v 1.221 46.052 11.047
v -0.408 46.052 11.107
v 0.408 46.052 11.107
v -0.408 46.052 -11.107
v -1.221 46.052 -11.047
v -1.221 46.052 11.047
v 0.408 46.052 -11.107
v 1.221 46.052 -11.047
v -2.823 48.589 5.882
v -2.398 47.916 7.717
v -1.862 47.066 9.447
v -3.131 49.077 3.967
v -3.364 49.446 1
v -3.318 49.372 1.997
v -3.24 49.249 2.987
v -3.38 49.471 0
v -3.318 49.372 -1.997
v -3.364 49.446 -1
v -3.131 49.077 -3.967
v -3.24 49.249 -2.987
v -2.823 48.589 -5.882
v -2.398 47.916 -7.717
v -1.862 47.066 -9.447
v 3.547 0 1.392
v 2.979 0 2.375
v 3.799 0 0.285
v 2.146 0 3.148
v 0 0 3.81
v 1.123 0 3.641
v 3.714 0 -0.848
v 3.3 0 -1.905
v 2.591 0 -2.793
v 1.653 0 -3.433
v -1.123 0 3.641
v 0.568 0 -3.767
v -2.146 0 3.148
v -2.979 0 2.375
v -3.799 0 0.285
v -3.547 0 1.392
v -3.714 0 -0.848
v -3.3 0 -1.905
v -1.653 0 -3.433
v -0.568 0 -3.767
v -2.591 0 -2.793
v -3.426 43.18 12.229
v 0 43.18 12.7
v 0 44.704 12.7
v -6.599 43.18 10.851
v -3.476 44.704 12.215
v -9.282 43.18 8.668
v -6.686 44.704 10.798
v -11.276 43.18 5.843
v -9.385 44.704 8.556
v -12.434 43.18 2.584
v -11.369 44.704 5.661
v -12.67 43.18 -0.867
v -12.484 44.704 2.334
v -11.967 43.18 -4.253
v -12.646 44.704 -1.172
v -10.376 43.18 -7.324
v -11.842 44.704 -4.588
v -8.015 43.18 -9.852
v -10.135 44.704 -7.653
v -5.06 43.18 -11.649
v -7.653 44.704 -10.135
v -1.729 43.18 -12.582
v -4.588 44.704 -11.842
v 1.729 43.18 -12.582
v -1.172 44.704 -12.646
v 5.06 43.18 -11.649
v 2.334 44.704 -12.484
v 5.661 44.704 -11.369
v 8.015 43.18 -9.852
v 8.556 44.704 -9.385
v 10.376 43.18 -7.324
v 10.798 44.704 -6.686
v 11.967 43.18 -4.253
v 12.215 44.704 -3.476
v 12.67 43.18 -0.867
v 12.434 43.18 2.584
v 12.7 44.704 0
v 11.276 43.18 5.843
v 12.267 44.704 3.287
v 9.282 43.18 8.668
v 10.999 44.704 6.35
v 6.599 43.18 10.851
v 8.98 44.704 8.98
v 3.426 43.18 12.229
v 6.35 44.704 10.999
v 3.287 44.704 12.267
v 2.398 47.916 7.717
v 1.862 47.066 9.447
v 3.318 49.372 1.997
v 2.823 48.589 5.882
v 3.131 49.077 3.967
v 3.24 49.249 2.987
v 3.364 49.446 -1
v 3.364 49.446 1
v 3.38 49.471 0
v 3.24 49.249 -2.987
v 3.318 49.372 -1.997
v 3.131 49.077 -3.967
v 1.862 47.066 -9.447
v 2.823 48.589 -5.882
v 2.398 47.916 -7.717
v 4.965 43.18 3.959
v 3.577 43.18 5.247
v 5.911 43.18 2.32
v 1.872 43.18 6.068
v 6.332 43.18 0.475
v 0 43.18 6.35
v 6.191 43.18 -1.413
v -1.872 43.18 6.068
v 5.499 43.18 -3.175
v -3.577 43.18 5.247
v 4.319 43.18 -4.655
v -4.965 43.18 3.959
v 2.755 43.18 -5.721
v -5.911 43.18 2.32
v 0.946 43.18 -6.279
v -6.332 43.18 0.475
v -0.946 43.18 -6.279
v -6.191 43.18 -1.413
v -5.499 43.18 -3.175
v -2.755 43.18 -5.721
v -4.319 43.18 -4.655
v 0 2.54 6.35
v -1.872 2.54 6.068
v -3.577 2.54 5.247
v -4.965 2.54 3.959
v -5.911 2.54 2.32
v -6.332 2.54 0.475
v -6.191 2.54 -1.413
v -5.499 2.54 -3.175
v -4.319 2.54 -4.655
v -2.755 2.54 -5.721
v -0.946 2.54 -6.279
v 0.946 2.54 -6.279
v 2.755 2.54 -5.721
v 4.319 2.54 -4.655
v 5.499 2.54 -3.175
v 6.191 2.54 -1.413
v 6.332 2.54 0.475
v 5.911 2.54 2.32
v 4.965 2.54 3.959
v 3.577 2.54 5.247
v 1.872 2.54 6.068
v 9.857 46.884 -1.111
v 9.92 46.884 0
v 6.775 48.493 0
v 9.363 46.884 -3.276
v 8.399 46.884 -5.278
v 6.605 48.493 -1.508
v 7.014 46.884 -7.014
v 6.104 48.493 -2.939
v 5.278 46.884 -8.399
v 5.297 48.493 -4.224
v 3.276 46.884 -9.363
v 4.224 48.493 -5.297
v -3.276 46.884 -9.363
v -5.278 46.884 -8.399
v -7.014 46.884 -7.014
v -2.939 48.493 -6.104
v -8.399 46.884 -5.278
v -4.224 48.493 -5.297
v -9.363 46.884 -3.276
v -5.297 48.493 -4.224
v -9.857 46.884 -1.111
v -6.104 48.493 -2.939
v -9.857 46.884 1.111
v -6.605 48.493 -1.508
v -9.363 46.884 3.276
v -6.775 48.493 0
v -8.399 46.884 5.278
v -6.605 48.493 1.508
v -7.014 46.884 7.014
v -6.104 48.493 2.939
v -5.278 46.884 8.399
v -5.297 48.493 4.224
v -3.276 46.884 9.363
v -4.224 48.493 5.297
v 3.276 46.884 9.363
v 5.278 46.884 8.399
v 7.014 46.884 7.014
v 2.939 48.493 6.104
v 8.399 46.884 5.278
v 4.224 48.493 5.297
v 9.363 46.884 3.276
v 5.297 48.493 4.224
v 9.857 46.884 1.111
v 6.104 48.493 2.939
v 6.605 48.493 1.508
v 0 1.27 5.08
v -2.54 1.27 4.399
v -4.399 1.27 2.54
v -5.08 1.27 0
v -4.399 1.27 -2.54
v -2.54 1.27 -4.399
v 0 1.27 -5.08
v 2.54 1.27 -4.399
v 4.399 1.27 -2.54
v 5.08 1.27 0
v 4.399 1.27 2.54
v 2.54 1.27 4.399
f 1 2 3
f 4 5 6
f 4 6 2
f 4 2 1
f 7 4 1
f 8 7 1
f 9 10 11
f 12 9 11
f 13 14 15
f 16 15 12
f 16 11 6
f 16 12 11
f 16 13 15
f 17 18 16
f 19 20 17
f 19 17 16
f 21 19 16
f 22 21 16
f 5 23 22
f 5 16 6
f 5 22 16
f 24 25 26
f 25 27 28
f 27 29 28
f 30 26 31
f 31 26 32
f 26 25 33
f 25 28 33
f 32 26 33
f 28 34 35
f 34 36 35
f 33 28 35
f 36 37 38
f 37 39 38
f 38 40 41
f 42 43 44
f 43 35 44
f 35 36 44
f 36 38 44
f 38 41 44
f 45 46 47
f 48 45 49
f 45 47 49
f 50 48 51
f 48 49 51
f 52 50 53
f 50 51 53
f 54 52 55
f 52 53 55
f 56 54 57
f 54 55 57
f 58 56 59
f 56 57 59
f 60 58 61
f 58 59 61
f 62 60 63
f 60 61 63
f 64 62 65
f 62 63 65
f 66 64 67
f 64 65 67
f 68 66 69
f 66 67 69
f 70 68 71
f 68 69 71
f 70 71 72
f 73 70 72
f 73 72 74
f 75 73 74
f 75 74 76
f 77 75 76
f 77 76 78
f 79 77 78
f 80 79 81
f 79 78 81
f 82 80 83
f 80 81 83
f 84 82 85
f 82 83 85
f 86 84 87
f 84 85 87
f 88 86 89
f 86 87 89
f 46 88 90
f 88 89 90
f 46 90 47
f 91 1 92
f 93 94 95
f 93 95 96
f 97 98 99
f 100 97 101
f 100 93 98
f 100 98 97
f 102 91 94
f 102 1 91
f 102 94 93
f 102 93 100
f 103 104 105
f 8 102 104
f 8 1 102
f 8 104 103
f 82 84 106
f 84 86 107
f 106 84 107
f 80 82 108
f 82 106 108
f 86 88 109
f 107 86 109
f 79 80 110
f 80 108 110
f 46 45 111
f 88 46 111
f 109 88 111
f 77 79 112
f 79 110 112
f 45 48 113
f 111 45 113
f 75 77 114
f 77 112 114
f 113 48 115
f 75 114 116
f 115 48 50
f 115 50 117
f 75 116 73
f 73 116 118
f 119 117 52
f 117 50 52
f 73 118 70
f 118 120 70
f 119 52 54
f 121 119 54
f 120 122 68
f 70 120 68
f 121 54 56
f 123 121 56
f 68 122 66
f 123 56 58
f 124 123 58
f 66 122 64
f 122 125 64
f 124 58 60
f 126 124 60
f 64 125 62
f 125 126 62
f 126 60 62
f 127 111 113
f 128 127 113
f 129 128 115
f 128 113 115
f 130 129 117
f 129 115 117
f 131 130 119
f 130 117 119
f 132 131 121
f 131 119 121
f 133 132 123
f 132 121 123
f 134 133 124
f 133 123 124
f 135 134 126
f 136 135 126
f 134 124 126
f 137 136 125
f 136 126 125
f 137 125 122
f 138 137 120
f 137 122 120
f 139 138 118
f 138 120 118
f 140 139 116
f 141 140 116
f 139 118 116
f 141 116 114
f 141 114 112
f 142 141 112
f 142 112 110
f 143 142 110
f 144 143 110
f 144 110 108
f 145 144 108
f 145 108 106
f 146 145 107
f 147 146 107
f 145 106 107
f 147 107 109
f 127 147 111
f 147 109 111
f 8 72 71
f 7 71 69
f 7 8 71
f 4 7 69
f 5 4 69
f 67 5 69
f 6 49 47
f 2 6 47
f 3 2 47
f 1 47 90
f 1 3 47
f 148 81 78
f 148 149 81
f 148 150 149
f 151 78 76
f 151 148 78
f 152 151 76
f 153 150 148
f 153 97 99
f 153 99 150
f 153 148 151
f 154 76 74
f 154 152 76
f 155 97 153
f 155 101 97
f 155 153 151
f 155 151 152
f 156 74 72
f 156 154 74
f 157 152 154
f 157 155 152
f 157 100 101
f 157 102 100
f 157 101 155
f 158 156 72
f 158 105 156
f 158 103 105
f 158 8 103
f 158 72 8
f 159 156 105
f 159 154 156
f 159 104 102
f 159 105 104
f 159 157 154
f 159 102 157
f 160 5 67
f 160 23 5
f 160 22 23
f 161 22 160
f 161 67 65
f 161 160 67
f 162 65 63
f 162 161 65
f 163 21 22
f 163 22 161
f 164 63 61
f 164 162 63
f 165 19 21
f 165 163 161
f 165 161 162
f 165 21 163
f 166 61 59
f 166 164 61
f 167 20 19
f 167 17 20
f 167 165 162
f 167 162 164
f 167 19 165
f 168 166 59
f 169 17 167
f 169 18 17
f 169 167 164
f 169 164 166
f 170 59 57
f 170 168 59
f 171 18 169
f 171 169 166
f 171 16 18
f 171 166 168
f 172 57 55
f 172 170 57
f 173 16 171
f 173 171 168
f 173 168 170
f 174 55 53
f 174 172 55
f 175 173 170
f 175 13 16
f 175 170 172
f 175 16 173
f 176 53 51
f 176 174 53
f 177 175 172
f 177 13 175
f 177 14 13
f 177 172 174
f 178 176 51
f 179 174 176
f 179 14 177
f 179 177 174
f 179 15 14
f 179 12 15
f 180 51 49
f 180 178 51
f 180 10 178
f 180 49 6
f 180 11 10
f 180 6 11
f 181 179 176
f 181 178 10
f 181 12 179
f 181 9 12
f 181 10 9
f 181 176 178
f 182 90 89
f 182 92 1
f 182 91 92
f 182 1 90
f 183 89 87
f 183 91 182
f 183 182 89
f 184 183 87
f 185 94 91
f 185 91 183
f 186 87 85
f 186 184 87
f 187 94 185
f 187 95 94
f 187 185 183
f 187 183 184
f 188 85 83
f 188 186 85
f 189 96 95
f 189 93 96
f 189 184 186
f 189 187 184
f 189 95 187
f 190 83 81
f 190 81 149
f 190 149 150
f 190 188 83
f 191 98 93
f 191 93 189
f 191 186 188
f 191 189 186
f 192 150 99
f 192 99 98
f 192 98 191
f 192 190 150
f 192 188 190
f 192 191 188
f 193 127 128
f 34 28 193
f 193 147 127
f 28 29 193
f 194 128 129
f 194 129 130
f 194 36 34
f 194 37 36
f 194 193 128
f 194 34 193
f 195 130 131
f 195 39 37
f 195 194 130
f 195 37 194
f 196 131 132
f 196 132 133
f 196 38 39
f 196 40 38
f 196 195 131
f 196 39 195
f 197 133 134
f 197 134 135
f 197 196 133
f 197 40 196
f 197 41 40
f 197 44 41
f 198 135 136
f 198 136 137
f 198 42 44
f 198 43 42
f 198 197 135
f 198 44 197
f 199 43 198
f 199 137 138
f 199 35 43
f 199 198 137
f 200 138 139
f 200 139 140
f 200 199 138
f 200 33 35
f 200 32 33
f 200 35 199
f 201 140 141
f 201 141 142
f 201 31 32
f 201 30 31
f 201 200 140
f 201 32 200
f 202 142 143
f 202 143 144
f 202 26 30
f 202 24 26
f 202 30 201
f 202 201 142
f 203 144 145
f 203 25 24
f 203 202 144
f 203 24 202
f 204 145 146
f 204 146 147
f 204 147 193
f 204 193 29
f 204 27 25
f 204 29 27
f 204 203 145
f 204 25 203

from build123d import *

# Parameters (mm, degrees)
CUT_EXTRUDE1_DEPTH      = 53.924726322676435
CUT_EXTRUDE1_DEPTH_BACK = 53.924726322676435
CHAMFER1_SIZE           = 2.54


# Read off the part's stored shape, not the designer's step: Dome1
with BuildPart() as part:
    # Sketch1 → Revolve1 (revolve)
    with BuildSketch(Plane.XY, mode=Mode.PRIVATE) as revolve1_sk:
        Polygon((0, 0), (-6.3500000000000005, 0), (-6.3500000000000005, 43.17999999999999), (-12.700000000000003, 43.17999999999999), (-12.700000000000003, 44.70399999999999), (0, 44.70399999999999), align=None)
    revolve(revolve1_sk.sketch.rotate(Axis((0, 0, 0), (0, -1, 0)), 270), axis=Axis((0, 0, 0), (0, -1, 0)))

    # Dome1 outline → Dome1 (revolve)
    with BuildSketch(Plane.XY):
        with BuildLine():
            Line((0, 44.704), (12.700000013, 44.703999987))
            ThreePointArc((12.700000013, 44.703999987), (6.839159314, 48.466898259), (0, 49.784))
            Line((0, 49.784), (0, 44.704))
        make_face()
    revolve(axis=Axis((0, 0, 0), (0, 1, 0)))

    # Sketch2 → Cut-Extrude1 (cut, two sides: drawn at the far end of the back side and taken through both)
    with BuildSketch(Plane.XY.offset(-CUT_EXTRUDE1_DEPTH_BACK)):
        Polygon((-64.2561959287237, 145.90092038345463), (-3.3800930162397096, 49.47113236614868), (-1.2214464709934951, 46.05176386515196), (1.2214464709934951, 46.05176386515196), (3.3800930162397096, 49.47113236614868), (64.2561959287237, 145.90092038345463), (64.2561959287237, 373.97638090364217), (-64.2561959287237, 373.97638090364217), align=None)
    extrude(amount=CUT_EXTRUDE1_DEPTH + CUT_EXTRUDE1_DEPTH_BACK, mode=Mode.SUBTRACT)

    # Chamfer1
    chamfer1_edges = [part.edges().sort_by_distance(p)[0] for p in [
        (-2.19e-15, 0, -6.3500000000000005),
    ]]
    chamfer(chamfer1_edges, length=CHAMFER1_SIZE)


solid = part.part
